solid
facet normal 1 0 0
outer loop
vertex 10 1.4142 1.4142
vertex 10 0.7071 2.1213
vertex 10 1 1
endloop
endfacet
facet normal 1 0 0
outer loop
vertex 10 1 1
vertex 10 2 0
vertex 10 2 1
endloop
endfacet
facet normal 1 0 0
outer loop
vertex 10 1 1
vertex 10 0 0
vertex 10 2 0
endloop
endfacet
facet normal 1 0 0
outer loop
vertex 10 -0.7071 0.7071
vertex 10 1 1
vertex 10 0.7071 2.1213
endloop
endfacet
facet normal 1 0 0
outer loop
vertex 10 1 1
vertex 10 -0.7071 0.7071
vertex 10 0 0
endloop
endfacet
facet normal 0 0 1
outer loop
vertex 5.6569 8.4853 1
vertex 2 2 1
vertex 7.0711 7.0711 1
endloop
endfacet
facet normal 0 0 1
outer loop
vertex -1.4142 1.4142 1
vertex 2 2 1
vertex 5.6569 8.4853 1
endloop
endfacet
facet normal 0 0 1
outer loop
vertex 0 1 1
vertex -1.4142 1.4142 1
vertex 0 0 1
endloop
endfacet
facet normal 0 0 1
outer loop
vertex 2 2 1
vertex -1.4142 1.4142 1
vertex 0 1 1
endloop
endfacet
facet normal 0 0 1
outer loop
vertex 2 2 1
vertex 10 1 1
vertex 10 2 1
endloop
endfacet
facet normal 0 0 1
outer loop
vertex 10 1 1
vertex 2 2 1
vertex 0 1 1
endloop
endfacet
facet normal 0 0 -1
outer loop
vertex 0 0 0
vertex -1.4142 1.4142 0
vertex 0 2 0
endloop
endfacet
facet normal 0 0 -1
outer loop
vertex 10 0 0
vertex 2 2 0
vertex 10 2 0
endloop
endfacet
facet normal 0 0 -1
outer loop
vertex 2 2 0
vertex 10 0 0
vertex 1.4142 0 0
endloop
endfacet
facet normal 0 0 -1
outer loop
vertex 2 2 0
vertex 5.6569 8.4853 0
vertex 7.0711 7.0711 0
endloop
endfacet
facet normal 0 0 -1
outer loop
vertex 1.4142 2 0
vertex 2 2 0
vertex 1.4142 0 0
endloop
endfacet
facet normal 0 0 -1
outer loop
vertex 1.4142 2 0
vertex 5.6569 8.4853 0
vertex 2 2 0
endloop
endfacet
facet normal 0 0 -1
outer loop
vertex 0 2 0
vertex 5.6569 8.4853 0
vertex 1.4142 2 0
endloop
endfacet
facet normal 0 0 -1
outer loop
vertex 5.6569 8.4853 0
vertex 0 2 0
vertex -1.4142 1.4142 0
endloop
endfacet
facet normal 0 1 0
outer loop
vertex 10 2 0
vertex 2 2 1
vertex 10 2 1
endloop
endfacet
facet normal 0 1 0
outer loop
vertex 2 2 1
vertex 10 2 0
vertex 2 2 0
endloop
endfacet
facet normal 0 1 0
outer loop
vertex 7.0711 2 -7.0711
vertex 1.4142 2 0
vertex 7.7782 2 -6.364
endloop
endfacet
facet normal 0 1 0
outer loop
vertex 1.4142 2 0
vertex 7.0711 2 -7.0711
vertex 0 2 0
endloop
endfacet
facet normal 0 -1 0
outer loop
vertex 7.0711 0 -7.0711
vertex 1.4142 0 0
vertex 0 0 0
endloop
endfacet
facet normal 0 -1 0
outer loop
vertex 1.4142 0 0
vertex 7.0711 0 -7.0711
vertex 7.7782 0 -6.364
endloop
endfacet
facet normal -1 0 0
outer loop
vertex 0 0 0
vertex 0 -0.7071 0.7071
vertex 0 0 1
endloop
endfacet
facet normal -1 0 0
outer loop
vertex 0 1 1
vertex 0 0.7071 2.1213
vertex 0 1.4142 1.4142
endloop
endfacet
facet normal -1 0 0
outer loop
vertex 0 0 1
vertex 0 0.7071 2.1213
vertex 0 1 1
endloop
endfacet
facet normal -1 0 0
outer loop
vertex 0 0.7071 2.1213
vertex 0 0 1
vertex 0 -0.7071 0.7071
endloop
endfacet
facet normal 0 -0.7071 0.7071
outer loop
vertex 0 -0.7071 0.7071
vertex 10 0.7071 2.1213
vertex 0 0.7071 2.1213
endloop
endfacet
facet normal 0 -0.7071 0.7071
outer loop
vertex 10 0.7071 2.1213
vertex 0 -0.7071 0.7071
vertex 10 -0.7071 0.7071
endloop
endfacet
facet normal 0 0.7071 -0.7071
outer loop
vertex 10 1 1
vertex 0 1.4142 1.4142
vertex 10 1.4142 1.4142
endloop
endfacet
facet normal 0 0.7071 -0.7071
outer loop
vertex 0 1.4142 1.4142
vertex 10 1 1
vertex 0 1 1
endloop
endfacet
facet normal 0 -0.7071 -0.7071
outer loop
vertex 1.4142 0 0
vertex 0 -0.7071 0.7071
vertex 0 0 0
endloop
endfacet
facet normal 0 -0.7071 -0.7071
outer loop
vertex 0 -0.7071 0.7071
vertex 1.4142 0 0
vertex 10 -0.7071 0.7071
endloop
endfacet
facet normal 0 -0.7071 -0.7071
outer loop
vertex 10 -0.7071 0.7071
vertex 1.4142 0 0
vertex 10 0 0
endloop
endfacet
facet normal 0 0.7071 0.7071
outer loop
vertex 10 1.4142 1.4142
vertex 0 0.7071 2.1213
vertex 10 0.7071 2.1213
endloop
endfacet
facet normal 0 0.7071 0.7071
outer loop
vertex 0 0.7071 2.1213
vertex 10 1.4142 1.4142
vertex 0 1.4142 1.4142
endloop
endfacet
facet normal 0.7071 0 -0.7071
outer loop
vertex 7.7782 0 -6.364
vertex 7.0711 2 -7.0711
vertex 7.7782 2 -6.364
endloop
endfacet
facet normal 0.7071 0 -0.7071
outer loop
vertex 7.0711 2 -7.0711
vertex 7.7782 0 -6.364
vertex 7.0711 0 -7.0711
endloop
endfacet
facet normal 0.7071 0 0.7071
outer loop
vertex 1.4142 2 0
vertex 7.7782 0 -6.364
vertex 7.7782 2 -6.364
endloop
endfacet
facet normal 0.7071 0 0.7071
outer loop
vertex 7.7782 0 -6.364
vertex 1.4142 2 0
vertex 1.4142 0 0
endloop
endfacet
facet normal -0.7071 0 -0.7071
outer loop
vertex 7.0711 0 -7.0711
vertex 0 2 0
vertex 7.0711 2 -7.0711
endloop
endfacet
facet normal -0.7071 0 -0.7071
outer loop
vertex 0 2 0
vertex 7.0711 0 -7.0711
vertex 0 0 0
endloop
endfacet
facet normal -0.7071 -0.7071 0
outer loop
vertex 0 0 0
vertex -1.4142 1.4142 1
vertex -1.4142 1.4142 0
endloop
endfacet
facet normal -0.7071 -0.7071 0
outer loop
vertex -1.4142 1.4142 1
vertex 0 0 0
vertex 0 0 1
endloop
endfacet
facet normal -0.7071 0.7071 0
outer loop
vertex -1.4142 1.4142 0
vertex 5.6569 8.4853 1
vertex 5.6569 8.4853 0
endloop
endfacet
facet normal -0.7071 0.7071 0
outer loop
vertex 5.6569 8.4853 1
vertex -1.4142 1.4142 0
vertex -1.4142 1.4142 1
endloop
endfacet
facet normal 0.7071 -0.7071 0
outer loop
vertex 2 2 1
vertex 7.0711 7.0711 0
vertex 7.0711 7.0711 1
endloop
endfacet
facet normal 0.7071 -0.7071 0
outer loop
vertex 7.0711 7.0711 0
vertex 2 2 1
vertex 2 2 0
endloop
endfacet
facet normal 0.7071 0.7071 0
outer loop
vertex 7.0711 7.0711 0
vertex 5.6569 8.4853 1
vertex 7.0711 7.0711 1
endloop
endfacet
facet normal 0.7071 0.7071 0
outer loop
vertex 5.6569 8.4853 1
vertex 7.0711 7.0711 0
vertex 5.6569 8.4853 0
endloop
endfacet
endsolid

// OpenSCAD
use <../polychannel.scad>

module stick() {
    cube([10, 2, 1]);
}

color("lightblue") stick();

rot_x_45 = rot_x(45);
color("red") rotate(a=rot_x_45[0], v=rot_x_45[1]) stick();

rot_y_45 = rot_y(45);
color("lightgreen") rotate(a=rot_y_45[0], v=rot_y_45[1]) stick();

rot_z_45 = rot_z(45);
color("gray") rotate(a=rot_z_45[0], v=rot_z_45[1]) stick();

// Annotations
color("lightblue") translate([15,4,3]) rotate([90,0,180]) scale(0.1) text("Original",halign="center",valign="center");
color("red") translate([15,4,1.6]) rotate([90,0,180]) scale(0.1) text("rot_x(45)",halign="center",valign="center");
color("lightgreen") translate([15,4,0.2]) rotate([90,0,180]) scale(0.1) text("rot_y(45)",halign="center",valign="center");
color("gray") translate([15,4,-1.2]) rotate([90,0,180]) scale(0.1) text("rot_z(45)",halign="center",valign="center");
